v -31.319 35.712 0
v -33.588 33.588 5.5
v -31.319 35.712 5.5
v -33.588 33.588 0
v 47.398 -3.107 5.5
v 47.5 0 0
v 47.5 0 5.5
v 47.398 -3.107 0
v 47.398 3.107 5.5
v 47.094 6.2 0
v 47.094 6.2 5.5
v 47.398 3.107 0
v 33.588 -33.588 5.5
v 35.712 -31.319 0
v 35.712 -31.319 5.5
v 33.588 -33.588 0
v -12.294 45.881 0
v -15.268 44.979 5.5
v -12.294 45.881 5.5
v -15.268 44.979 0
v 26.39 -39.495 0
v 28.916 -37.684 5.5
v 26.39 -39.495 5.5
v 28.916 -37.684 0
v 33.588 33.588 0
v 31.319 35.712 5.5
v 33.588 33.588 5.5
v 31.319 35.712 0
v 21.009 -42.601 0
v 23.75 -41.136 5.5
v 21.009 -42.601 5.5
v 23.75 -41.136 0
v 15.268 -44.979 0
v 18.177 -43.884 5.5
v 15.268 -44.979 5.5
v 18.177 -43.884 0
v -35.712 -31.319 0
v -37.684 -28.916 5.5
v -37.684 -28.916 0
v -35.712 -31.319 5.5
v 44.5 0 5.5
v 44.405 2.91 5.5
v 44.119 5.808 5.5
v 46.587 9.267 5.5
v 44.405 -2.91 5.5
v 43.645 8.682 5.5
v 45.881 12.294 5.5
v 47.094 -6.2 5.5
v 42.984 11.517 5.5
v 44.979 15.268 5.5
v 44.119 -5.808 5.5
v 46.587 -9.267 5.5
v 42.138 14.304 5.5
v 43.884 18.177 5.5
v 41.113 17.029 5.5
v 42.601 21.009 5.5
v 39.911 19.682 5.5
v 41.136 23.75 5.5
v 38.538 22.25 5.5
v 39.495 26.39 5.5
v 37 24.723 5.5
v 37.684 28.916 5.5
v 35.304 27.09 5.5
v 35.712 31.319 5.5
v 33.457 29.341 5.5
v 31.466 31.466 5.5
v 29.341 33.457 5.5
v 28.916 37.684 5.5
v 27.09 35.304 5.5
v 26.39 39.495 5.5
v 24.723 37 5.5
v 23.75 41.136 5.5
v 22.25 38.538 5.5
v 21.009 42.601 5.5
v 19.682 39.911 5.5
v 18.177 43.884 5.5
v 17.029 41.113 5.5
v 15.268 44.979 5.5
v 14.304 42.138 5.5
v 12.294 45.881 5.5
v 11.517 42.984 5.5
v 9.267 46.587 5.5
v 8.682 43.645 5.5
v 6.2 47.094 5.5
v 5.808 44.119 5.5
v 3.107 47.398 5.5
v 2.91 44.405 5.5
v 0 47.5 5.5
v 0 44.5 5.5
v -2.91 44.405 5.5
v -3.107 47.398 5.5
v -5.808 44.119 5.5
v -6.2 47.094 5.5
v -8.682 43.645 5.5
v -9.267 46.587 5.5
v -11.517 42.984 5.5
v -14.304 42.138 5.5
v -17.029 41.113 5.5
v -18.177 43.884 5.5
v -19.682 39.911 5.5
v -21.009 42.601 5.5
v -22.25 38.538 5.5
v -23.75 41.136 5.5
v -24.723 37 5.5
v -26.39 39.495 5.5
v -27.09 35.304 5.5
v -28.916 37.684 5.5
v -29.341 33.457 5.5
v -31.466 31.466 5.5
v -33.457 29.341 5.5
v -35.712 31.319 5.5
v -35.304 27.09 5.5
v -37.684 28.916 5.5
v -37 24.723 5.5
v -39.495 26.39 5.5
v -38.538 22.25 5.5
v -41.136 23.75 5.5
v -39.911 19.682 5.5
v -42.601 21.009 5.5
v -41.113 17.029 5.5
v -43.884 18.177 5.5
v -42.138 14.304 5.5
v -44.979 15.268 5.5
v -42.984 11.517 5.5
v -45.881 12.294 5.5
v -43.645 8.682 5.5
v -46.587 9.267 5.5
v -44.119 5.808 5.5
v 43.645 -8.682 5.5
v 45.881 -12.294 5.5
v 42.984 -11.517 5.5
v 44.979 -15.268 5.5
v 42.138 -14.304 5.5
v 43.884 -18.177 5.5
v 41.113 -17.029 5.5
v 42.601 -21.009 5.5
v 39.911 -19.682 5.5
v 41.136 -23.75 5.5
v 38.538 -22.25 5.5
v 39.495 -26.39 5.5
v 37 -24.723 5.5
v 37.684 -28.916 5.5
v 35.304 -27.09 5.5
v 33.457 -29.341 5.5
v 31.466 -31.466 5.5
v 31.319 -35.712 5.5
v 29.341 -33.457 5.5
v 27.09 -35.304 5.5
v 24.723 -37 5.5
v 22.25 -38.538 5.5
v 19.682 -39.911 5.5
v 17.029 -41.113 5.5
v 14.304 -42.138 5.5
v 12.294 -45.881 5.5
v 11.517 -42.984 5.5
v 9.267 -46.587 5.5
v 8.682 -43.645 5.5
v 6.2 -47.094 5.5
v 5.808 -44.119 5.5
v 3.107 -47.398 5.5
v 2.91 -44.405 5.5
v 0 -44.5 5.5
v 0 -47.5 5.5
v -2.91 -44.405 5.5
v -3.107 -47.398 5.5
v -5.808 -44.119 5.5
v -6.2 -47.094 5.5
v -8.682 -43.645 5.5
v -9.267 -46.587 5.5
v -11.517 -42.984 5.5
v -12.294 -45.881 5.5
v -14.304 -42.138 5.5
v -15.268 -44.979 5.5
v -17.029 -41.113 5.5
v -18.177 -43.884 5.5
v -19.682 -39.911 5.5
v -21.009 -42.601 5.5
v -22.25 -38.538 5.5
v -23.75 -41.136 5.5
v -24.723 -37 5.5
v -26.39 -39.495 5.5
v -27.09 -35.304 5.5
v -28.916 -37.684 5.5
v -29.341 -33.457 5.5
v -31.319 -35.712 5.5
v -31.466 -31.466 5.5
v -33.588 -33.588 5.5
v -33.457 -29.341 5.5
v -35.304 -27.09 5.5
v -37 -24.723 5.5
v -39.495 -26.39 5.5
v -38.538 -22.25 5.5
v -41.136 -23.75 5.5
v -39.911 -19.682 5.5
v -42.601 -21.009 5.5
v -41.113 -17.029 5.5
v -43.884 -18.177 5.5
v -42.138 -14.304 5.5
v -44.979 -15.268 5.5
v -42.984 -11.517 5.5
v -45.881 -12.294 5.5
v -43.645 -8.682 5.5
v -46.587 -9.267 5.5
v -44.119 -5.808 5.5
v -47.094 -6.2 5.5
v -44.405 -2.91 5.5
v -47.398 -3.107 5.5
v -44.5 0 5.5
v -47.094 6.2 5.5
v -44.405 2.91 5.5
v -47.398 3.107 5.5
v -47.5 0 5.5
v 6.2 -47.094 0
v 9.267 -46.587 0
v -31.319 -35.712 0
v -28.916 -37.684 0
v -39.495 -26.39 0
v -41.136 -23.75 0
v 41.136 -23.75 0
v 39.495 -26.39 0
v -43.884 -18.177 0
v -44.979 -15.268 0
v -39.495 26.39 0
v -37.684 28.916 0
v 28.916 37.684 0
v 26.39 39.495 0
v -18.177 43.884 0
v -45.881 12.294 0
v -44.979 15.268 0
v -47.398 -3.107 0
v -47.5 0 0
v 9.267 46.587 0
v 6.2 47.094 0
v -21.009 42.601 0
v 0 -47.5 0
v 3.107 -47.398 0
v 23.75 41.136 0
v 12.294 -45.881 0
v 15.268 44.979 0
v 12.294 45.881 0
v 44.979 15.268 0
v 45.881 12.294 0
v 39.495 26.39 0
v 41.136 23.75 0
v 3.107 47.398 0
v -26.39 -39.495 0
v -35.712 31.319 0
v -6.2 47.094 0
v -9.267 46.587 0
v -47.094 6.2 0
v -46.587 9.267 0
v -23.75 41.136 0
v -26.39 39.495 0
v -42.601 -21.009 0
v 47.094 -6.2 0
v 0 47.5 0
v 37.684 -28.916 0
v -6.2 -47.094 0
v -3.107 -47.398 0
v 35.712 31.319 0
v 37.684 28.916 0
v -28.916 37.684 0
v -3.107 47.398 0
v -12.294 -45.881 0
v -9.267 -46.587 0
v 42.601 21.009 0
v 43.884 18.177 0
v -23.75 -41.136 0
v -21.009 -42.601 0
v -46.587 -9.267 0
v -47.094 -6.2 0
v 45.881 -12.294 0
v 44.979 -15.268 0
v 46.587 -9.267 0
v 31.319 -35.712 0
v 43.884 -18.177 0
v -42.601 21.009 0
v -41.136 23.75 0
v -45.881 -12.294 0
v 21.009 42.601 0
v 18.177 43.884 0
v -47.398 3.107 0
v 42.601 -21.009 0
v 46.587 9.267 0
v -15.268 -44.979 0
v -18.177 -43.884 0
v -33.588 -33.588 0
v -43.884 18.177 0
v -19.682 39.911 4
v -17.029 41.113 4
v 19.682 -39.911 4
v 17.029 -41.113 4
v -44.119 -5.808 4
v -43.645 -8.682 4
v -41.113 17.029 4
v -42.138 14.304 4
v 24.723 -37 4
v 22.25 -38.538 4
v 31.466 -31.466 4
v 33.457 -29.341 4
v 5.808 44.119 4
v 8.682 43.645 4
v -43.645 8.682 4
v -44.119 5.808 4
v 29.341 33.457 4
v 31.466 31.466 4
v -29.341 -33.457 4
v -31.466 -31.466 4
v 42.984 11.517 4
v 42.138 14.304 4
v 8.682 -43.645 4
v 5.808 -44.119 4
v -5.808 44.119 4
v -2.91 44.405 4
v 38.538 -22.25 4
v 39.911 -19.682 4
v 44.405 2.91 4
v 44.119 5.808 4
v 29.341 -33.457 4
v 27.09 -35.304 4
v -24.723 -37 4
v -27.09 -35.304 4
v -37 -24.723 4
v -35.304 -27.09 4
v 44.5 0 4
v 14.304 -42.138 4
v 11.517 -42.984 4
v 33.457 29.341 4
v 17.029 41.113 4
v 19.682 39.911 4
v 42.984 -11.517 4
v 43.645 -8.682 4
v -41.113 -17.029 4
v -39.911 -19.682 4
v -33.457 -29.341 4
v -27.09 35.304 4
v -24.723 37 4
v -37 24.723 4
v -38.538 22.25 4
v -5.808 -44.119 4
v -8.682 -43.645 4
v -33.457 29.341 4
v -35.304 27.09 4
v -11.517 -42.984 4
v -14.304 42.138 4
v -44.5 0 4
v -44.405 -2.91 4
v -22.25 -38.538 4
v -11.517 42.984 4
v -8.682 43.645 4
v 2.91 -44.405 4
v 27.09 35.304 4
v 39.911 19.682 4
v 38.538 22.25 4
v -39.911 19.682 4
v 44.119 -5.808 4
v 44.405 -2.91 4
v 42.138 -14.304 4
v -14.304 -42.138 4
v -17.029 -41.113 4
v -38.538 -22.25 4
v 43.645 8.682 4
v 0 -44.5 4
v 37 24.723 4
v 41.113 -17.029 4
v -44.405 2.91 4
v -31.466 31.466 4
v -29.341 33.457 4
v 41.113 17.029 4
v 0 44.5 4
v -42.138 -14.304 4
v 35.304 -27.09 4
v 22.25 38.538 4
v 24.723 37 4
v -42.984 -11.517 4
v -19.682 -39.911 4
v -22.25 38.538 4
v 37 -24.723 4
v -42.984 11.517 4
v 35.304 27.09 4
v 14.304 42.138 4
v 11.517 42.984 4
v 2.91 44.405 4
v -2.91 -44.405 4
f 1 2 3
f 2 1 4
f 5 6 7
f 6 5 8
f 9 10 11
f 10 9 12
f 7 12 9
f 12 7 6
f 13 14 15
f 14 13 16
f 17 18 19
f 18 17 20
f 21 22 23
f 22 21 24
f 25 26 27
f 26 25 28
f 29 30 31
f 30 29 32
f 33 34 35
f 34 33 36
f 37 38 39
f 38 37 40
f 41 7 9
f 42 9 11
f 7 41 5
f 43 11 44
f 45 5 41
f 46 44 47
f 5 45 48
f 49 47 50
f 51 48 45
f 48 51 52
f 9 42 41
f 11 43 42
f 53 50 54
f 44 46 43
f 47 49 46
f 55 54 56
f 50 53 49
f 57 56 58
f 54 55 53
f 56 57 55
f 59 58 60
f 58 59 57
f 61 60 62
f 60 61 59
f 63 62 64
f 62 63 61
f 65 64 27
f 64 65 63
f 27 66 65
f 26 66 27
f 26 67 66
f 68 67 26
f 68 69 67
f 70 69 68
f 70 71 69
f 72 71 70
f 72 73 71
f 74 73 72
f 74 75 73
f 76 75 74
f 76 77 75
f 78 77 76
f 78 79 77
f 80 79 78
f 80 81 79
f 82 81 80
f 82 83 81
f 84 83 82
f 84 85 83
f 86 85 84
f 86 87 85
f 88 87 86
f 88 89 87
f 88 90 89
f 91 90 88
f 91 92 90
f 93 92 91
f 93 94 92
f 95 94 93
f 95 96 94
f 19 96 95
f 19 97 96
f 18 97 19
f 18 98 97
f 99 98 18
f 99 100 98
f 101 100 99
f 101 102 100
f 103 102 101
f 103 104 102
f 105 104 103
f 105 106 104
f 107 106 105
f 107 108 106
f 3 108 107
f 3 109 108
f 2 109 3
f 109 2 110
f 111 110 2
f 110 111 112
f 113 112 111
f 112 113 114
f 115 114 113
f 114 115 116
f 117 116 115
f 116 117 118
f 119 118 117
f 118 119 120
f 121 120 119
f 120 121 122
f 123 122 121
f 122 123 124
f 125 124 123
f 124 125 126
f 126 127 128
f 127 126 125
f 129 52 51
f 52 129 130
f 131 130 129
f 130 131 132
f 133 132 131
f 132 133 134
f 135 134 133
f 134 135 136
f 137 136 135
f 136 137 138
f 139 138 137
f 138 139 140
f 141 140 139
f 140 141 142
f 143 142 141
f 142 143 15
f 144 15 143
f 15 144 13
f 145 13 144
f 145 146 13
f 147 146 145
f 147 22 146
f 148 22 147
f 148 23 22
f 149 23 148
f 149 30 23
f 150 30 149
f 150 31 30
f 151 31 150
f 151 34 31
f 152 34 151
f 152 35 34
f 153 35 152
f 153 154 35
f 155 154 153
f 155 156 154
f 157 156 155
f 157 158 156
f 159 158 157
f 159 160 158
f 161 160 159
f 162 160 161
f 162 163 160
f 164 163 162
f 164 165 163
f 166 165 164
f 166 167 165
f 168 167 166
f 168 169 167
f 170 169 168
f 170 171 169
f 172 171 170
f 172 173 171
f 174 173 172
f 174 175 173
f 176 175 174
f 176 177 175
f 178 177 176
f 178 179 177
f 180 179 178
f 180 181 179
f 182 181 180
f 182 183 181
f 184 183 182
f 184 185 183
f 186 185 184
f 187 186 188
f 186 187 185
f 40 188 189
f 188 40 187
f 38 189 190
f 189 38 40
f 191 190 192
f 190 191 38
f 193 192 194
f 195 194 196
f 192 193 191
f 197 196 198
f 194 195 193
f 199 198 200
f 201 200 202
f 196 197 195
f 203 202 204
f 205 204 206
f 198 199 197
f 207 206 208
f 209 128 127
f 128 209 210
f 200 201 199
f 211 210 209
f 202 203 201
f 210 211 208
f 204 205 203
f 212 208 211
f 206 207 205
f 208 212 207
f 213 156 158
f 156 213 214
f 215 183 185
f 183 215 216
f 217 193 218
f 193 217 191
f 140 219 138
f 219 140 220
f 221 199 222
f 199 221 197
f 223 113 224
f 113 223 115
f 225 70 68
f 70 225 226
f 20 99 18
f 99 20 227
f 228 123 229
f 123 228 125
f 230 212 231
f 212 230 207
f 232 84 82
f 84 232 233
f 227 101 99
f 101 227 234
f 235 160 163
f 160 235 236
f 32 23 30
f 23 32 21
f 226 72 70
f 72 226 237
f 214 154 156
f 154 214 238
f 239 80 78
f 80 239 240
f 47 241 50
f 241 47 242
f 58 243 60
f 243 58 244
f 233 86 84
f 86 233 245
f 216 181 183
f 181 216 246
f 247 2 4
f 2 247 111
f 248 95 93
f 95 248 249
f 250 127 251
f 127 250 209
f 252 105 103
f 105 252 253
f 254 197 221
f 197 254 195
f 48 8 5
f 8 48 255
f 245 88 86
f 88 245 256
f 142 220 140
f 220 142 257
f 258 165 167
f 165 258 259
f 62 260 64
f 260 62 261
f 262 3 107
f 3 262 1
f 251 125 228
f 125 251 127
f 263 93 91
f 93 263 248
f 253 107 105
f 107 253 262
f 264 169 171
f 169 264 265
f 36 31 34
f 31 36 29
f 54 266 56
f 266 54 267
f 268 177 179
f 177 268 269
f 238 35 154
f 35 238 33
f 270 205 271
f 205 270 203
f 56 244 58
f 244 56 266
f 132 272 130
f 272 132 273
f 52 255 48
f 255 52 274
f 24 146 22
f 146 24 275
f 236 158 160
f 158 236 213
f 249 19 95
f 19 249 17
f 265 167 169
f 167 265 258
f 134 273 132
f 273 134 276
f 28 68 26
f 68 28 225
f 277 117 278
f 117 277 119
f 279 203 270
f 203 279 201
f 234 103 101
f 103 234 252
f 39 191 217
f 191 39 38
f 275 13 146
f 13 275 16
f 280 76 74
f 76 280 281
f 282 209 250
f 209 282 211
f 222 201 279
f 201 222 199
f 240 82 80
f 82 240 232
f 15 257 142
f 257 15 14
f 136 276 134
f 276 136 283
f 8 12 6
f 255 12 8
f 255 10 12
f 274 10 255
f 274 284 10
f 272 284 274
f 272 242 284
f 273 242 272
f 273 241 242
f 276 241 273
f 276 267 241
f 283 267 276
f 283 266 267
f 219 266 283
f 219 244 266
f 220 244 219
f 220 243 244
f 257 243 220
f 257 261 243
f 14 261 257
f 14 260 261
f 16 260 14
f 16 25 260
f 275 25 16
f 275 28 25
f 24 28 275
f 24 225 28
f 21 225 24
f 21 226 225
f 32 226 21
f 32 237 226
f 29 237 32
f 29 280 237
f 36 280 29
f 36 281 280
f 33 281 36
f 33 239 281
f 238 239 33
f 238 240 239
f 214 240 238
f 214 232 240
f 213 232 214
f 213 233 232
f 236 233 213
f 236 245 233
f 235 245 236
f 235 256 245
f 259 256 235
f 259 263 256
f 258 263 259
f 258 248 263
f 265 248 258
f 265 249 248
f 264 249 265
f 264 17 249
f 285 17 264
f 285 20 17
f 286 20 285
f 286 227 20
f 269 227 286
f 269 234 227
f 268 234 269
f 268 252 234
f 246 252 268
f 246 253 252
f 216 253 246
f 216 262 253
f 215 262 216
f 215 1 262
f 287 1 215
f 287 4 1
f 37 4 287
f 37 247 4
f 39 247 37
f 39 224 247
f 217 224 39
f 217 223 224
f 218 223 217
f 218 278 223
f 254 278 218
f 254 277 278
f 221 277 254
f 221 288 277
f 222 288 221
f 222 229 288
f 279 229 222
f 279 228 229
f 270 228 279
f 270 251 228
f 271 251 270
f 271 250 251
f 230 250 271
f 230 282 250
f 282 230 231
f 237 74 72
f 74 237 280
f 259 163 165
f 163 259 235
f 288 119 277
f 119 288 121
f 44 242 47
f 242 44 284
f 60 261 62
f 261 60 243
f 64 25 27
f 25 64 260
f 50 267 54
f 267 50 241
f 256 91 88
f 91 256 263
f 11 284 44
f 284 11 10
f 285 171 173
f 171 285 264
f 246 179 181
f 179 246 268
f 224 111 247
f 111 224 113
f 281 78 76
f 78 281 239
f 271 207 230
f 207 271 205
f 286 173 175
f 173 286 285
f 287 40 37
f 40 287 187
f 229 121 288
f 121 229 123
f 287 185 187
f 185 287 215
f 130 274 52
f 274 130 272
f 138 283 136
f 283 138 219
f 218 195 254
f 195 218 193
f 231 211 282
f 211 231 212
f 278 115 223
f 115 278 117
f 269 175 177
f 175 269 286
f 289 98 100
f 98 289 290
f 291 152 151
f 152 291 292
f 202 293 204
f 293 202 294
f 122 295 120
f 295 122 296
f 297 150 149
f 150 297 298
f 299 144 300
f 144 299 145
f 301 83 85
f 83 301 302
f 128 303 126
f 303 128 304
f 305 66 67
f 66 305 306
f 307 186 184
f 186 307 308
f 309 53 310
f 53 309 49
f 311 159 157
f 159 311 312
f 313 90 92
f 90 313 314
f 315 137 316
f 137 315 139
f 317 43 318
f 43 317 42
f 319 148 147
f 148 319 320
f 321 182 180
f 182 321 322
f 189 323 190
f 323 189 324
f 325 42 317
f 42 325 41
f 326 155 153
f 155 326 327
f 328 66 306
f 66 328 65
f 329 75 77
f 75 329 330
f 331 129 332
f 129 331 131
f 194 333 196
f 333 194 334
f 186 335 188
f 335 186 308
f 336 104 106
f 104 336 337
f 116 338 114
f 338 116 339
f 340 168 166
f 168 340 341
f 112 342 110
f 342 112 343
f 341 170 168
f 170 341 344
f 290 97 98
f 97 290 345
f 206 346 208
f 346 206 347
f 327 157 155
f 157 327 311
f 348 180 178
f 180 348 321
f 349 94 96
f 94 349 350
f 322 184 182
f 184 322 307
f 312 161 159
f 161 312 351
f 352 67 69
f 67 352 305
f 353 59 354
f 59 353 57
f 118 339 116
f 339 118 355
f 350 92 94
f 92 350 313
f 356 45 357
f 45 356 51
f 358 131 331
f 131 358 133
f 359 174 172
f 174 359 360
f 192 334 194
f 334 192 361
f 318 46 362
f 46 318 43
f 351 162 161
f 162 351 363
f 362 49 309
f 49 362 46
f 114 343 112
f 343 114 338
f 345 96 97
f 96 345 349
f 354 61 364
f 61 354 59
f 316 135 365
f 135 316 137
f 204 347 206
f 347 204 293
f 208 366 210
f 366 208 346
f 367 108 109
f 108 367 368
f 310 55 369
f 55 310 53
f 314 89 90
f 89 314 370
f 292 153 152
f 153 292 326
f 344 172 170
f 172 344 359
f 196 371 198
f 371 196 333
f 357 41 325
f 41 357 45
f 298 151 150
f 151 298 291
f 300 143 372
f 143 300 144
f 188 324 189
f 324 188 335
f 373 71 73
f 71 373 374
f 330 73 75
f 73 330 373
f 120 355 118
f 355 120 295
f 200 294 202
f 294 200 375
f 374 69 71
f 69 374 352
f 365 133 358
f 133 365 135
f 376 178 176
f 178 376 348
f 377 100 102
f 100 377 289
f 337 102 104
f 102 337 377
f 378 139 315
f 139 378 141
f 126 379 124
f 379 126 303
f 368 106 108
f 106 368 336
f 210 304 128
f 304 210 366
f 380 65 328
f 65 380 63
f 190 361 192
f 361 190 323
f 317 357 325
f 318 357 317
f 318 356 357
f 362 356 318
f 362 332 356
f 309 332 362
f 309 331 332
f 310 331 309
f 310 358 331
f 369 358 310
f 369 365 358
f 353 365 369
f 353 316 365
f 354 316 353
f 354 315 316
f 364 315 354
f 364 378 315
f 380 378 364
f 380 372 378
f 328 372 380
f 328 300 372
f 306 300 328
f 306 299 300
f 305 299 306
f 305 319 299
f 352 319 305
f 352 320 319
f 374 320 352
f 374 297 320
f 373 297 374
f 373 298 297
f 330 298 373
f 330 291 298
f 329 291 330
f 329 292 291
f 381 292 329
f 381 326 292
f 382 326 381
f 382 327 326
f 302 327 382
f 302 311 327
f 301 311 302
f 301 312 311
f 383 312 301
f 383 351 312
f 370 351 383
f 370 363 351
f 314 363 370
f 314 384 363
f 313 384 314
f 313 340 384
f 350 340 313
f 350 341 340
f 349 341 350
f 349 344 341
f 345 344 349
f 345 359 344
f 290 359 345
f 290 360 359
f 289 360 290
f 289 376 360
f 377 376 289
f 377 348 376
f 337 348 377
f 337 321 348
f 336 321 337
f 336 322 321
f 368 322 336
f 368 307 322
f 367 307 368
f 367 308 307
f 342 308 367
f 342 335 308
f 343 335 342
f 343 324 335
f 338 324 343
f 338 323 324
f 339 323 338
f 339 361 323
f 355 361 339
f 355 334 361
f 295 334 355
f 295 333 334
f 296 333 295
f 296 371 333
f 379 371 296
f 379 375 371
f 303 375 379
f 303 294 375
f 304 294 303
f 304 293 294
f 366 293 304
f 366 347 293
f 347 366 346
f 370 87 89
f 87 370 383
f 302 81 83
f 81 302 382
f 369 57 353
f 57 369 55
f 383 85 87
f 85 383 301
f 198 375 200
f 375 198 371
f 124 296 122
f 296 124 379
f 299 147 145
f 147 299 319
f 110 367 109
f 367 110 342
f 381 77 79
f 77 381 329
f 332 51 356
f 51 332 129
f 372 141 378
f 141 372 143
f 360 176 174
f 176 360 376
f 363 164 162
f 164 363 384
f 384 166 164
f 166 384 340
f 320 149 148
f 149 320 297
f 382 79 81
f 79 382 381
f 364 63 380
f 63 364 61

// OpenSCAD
// Sottobicchiere: cerchio, esagono o quadrato con bordo rialzato e testo inciso facoltativo.
forma = "cerchio";
diametro = 95;
spessore = 4;
bordo = 1.5;      // altezza del bordo rialzato (0 = piatto)
testo = "";

FONT = "DejaVu Sans:style=Bold";
dimensione_testo = diametro / 8;
lati = forma == "esagono" ? 6 : forma == "quadrato" ? 4 : 96;
rot = forma == "quadrato" ? 45 : 0;

difference() {
    rotate(rot) cylinder(d = diametro, h = spessore + bordo, $fn = lati);
    if (bordo > 0)
        translate([0, 0, spessore]) rotate(rot) cylinder(d = diametro - 6, h = bordo + 1, $fn = lati);
    if (len(testo) > 0)
        translate([0, 0, spessore - 0.8])
            linear_extrude(1 + bordo)
                text(testo, size = dimensione_testo, font = FONT, halign = "center", valign = "center");
}
